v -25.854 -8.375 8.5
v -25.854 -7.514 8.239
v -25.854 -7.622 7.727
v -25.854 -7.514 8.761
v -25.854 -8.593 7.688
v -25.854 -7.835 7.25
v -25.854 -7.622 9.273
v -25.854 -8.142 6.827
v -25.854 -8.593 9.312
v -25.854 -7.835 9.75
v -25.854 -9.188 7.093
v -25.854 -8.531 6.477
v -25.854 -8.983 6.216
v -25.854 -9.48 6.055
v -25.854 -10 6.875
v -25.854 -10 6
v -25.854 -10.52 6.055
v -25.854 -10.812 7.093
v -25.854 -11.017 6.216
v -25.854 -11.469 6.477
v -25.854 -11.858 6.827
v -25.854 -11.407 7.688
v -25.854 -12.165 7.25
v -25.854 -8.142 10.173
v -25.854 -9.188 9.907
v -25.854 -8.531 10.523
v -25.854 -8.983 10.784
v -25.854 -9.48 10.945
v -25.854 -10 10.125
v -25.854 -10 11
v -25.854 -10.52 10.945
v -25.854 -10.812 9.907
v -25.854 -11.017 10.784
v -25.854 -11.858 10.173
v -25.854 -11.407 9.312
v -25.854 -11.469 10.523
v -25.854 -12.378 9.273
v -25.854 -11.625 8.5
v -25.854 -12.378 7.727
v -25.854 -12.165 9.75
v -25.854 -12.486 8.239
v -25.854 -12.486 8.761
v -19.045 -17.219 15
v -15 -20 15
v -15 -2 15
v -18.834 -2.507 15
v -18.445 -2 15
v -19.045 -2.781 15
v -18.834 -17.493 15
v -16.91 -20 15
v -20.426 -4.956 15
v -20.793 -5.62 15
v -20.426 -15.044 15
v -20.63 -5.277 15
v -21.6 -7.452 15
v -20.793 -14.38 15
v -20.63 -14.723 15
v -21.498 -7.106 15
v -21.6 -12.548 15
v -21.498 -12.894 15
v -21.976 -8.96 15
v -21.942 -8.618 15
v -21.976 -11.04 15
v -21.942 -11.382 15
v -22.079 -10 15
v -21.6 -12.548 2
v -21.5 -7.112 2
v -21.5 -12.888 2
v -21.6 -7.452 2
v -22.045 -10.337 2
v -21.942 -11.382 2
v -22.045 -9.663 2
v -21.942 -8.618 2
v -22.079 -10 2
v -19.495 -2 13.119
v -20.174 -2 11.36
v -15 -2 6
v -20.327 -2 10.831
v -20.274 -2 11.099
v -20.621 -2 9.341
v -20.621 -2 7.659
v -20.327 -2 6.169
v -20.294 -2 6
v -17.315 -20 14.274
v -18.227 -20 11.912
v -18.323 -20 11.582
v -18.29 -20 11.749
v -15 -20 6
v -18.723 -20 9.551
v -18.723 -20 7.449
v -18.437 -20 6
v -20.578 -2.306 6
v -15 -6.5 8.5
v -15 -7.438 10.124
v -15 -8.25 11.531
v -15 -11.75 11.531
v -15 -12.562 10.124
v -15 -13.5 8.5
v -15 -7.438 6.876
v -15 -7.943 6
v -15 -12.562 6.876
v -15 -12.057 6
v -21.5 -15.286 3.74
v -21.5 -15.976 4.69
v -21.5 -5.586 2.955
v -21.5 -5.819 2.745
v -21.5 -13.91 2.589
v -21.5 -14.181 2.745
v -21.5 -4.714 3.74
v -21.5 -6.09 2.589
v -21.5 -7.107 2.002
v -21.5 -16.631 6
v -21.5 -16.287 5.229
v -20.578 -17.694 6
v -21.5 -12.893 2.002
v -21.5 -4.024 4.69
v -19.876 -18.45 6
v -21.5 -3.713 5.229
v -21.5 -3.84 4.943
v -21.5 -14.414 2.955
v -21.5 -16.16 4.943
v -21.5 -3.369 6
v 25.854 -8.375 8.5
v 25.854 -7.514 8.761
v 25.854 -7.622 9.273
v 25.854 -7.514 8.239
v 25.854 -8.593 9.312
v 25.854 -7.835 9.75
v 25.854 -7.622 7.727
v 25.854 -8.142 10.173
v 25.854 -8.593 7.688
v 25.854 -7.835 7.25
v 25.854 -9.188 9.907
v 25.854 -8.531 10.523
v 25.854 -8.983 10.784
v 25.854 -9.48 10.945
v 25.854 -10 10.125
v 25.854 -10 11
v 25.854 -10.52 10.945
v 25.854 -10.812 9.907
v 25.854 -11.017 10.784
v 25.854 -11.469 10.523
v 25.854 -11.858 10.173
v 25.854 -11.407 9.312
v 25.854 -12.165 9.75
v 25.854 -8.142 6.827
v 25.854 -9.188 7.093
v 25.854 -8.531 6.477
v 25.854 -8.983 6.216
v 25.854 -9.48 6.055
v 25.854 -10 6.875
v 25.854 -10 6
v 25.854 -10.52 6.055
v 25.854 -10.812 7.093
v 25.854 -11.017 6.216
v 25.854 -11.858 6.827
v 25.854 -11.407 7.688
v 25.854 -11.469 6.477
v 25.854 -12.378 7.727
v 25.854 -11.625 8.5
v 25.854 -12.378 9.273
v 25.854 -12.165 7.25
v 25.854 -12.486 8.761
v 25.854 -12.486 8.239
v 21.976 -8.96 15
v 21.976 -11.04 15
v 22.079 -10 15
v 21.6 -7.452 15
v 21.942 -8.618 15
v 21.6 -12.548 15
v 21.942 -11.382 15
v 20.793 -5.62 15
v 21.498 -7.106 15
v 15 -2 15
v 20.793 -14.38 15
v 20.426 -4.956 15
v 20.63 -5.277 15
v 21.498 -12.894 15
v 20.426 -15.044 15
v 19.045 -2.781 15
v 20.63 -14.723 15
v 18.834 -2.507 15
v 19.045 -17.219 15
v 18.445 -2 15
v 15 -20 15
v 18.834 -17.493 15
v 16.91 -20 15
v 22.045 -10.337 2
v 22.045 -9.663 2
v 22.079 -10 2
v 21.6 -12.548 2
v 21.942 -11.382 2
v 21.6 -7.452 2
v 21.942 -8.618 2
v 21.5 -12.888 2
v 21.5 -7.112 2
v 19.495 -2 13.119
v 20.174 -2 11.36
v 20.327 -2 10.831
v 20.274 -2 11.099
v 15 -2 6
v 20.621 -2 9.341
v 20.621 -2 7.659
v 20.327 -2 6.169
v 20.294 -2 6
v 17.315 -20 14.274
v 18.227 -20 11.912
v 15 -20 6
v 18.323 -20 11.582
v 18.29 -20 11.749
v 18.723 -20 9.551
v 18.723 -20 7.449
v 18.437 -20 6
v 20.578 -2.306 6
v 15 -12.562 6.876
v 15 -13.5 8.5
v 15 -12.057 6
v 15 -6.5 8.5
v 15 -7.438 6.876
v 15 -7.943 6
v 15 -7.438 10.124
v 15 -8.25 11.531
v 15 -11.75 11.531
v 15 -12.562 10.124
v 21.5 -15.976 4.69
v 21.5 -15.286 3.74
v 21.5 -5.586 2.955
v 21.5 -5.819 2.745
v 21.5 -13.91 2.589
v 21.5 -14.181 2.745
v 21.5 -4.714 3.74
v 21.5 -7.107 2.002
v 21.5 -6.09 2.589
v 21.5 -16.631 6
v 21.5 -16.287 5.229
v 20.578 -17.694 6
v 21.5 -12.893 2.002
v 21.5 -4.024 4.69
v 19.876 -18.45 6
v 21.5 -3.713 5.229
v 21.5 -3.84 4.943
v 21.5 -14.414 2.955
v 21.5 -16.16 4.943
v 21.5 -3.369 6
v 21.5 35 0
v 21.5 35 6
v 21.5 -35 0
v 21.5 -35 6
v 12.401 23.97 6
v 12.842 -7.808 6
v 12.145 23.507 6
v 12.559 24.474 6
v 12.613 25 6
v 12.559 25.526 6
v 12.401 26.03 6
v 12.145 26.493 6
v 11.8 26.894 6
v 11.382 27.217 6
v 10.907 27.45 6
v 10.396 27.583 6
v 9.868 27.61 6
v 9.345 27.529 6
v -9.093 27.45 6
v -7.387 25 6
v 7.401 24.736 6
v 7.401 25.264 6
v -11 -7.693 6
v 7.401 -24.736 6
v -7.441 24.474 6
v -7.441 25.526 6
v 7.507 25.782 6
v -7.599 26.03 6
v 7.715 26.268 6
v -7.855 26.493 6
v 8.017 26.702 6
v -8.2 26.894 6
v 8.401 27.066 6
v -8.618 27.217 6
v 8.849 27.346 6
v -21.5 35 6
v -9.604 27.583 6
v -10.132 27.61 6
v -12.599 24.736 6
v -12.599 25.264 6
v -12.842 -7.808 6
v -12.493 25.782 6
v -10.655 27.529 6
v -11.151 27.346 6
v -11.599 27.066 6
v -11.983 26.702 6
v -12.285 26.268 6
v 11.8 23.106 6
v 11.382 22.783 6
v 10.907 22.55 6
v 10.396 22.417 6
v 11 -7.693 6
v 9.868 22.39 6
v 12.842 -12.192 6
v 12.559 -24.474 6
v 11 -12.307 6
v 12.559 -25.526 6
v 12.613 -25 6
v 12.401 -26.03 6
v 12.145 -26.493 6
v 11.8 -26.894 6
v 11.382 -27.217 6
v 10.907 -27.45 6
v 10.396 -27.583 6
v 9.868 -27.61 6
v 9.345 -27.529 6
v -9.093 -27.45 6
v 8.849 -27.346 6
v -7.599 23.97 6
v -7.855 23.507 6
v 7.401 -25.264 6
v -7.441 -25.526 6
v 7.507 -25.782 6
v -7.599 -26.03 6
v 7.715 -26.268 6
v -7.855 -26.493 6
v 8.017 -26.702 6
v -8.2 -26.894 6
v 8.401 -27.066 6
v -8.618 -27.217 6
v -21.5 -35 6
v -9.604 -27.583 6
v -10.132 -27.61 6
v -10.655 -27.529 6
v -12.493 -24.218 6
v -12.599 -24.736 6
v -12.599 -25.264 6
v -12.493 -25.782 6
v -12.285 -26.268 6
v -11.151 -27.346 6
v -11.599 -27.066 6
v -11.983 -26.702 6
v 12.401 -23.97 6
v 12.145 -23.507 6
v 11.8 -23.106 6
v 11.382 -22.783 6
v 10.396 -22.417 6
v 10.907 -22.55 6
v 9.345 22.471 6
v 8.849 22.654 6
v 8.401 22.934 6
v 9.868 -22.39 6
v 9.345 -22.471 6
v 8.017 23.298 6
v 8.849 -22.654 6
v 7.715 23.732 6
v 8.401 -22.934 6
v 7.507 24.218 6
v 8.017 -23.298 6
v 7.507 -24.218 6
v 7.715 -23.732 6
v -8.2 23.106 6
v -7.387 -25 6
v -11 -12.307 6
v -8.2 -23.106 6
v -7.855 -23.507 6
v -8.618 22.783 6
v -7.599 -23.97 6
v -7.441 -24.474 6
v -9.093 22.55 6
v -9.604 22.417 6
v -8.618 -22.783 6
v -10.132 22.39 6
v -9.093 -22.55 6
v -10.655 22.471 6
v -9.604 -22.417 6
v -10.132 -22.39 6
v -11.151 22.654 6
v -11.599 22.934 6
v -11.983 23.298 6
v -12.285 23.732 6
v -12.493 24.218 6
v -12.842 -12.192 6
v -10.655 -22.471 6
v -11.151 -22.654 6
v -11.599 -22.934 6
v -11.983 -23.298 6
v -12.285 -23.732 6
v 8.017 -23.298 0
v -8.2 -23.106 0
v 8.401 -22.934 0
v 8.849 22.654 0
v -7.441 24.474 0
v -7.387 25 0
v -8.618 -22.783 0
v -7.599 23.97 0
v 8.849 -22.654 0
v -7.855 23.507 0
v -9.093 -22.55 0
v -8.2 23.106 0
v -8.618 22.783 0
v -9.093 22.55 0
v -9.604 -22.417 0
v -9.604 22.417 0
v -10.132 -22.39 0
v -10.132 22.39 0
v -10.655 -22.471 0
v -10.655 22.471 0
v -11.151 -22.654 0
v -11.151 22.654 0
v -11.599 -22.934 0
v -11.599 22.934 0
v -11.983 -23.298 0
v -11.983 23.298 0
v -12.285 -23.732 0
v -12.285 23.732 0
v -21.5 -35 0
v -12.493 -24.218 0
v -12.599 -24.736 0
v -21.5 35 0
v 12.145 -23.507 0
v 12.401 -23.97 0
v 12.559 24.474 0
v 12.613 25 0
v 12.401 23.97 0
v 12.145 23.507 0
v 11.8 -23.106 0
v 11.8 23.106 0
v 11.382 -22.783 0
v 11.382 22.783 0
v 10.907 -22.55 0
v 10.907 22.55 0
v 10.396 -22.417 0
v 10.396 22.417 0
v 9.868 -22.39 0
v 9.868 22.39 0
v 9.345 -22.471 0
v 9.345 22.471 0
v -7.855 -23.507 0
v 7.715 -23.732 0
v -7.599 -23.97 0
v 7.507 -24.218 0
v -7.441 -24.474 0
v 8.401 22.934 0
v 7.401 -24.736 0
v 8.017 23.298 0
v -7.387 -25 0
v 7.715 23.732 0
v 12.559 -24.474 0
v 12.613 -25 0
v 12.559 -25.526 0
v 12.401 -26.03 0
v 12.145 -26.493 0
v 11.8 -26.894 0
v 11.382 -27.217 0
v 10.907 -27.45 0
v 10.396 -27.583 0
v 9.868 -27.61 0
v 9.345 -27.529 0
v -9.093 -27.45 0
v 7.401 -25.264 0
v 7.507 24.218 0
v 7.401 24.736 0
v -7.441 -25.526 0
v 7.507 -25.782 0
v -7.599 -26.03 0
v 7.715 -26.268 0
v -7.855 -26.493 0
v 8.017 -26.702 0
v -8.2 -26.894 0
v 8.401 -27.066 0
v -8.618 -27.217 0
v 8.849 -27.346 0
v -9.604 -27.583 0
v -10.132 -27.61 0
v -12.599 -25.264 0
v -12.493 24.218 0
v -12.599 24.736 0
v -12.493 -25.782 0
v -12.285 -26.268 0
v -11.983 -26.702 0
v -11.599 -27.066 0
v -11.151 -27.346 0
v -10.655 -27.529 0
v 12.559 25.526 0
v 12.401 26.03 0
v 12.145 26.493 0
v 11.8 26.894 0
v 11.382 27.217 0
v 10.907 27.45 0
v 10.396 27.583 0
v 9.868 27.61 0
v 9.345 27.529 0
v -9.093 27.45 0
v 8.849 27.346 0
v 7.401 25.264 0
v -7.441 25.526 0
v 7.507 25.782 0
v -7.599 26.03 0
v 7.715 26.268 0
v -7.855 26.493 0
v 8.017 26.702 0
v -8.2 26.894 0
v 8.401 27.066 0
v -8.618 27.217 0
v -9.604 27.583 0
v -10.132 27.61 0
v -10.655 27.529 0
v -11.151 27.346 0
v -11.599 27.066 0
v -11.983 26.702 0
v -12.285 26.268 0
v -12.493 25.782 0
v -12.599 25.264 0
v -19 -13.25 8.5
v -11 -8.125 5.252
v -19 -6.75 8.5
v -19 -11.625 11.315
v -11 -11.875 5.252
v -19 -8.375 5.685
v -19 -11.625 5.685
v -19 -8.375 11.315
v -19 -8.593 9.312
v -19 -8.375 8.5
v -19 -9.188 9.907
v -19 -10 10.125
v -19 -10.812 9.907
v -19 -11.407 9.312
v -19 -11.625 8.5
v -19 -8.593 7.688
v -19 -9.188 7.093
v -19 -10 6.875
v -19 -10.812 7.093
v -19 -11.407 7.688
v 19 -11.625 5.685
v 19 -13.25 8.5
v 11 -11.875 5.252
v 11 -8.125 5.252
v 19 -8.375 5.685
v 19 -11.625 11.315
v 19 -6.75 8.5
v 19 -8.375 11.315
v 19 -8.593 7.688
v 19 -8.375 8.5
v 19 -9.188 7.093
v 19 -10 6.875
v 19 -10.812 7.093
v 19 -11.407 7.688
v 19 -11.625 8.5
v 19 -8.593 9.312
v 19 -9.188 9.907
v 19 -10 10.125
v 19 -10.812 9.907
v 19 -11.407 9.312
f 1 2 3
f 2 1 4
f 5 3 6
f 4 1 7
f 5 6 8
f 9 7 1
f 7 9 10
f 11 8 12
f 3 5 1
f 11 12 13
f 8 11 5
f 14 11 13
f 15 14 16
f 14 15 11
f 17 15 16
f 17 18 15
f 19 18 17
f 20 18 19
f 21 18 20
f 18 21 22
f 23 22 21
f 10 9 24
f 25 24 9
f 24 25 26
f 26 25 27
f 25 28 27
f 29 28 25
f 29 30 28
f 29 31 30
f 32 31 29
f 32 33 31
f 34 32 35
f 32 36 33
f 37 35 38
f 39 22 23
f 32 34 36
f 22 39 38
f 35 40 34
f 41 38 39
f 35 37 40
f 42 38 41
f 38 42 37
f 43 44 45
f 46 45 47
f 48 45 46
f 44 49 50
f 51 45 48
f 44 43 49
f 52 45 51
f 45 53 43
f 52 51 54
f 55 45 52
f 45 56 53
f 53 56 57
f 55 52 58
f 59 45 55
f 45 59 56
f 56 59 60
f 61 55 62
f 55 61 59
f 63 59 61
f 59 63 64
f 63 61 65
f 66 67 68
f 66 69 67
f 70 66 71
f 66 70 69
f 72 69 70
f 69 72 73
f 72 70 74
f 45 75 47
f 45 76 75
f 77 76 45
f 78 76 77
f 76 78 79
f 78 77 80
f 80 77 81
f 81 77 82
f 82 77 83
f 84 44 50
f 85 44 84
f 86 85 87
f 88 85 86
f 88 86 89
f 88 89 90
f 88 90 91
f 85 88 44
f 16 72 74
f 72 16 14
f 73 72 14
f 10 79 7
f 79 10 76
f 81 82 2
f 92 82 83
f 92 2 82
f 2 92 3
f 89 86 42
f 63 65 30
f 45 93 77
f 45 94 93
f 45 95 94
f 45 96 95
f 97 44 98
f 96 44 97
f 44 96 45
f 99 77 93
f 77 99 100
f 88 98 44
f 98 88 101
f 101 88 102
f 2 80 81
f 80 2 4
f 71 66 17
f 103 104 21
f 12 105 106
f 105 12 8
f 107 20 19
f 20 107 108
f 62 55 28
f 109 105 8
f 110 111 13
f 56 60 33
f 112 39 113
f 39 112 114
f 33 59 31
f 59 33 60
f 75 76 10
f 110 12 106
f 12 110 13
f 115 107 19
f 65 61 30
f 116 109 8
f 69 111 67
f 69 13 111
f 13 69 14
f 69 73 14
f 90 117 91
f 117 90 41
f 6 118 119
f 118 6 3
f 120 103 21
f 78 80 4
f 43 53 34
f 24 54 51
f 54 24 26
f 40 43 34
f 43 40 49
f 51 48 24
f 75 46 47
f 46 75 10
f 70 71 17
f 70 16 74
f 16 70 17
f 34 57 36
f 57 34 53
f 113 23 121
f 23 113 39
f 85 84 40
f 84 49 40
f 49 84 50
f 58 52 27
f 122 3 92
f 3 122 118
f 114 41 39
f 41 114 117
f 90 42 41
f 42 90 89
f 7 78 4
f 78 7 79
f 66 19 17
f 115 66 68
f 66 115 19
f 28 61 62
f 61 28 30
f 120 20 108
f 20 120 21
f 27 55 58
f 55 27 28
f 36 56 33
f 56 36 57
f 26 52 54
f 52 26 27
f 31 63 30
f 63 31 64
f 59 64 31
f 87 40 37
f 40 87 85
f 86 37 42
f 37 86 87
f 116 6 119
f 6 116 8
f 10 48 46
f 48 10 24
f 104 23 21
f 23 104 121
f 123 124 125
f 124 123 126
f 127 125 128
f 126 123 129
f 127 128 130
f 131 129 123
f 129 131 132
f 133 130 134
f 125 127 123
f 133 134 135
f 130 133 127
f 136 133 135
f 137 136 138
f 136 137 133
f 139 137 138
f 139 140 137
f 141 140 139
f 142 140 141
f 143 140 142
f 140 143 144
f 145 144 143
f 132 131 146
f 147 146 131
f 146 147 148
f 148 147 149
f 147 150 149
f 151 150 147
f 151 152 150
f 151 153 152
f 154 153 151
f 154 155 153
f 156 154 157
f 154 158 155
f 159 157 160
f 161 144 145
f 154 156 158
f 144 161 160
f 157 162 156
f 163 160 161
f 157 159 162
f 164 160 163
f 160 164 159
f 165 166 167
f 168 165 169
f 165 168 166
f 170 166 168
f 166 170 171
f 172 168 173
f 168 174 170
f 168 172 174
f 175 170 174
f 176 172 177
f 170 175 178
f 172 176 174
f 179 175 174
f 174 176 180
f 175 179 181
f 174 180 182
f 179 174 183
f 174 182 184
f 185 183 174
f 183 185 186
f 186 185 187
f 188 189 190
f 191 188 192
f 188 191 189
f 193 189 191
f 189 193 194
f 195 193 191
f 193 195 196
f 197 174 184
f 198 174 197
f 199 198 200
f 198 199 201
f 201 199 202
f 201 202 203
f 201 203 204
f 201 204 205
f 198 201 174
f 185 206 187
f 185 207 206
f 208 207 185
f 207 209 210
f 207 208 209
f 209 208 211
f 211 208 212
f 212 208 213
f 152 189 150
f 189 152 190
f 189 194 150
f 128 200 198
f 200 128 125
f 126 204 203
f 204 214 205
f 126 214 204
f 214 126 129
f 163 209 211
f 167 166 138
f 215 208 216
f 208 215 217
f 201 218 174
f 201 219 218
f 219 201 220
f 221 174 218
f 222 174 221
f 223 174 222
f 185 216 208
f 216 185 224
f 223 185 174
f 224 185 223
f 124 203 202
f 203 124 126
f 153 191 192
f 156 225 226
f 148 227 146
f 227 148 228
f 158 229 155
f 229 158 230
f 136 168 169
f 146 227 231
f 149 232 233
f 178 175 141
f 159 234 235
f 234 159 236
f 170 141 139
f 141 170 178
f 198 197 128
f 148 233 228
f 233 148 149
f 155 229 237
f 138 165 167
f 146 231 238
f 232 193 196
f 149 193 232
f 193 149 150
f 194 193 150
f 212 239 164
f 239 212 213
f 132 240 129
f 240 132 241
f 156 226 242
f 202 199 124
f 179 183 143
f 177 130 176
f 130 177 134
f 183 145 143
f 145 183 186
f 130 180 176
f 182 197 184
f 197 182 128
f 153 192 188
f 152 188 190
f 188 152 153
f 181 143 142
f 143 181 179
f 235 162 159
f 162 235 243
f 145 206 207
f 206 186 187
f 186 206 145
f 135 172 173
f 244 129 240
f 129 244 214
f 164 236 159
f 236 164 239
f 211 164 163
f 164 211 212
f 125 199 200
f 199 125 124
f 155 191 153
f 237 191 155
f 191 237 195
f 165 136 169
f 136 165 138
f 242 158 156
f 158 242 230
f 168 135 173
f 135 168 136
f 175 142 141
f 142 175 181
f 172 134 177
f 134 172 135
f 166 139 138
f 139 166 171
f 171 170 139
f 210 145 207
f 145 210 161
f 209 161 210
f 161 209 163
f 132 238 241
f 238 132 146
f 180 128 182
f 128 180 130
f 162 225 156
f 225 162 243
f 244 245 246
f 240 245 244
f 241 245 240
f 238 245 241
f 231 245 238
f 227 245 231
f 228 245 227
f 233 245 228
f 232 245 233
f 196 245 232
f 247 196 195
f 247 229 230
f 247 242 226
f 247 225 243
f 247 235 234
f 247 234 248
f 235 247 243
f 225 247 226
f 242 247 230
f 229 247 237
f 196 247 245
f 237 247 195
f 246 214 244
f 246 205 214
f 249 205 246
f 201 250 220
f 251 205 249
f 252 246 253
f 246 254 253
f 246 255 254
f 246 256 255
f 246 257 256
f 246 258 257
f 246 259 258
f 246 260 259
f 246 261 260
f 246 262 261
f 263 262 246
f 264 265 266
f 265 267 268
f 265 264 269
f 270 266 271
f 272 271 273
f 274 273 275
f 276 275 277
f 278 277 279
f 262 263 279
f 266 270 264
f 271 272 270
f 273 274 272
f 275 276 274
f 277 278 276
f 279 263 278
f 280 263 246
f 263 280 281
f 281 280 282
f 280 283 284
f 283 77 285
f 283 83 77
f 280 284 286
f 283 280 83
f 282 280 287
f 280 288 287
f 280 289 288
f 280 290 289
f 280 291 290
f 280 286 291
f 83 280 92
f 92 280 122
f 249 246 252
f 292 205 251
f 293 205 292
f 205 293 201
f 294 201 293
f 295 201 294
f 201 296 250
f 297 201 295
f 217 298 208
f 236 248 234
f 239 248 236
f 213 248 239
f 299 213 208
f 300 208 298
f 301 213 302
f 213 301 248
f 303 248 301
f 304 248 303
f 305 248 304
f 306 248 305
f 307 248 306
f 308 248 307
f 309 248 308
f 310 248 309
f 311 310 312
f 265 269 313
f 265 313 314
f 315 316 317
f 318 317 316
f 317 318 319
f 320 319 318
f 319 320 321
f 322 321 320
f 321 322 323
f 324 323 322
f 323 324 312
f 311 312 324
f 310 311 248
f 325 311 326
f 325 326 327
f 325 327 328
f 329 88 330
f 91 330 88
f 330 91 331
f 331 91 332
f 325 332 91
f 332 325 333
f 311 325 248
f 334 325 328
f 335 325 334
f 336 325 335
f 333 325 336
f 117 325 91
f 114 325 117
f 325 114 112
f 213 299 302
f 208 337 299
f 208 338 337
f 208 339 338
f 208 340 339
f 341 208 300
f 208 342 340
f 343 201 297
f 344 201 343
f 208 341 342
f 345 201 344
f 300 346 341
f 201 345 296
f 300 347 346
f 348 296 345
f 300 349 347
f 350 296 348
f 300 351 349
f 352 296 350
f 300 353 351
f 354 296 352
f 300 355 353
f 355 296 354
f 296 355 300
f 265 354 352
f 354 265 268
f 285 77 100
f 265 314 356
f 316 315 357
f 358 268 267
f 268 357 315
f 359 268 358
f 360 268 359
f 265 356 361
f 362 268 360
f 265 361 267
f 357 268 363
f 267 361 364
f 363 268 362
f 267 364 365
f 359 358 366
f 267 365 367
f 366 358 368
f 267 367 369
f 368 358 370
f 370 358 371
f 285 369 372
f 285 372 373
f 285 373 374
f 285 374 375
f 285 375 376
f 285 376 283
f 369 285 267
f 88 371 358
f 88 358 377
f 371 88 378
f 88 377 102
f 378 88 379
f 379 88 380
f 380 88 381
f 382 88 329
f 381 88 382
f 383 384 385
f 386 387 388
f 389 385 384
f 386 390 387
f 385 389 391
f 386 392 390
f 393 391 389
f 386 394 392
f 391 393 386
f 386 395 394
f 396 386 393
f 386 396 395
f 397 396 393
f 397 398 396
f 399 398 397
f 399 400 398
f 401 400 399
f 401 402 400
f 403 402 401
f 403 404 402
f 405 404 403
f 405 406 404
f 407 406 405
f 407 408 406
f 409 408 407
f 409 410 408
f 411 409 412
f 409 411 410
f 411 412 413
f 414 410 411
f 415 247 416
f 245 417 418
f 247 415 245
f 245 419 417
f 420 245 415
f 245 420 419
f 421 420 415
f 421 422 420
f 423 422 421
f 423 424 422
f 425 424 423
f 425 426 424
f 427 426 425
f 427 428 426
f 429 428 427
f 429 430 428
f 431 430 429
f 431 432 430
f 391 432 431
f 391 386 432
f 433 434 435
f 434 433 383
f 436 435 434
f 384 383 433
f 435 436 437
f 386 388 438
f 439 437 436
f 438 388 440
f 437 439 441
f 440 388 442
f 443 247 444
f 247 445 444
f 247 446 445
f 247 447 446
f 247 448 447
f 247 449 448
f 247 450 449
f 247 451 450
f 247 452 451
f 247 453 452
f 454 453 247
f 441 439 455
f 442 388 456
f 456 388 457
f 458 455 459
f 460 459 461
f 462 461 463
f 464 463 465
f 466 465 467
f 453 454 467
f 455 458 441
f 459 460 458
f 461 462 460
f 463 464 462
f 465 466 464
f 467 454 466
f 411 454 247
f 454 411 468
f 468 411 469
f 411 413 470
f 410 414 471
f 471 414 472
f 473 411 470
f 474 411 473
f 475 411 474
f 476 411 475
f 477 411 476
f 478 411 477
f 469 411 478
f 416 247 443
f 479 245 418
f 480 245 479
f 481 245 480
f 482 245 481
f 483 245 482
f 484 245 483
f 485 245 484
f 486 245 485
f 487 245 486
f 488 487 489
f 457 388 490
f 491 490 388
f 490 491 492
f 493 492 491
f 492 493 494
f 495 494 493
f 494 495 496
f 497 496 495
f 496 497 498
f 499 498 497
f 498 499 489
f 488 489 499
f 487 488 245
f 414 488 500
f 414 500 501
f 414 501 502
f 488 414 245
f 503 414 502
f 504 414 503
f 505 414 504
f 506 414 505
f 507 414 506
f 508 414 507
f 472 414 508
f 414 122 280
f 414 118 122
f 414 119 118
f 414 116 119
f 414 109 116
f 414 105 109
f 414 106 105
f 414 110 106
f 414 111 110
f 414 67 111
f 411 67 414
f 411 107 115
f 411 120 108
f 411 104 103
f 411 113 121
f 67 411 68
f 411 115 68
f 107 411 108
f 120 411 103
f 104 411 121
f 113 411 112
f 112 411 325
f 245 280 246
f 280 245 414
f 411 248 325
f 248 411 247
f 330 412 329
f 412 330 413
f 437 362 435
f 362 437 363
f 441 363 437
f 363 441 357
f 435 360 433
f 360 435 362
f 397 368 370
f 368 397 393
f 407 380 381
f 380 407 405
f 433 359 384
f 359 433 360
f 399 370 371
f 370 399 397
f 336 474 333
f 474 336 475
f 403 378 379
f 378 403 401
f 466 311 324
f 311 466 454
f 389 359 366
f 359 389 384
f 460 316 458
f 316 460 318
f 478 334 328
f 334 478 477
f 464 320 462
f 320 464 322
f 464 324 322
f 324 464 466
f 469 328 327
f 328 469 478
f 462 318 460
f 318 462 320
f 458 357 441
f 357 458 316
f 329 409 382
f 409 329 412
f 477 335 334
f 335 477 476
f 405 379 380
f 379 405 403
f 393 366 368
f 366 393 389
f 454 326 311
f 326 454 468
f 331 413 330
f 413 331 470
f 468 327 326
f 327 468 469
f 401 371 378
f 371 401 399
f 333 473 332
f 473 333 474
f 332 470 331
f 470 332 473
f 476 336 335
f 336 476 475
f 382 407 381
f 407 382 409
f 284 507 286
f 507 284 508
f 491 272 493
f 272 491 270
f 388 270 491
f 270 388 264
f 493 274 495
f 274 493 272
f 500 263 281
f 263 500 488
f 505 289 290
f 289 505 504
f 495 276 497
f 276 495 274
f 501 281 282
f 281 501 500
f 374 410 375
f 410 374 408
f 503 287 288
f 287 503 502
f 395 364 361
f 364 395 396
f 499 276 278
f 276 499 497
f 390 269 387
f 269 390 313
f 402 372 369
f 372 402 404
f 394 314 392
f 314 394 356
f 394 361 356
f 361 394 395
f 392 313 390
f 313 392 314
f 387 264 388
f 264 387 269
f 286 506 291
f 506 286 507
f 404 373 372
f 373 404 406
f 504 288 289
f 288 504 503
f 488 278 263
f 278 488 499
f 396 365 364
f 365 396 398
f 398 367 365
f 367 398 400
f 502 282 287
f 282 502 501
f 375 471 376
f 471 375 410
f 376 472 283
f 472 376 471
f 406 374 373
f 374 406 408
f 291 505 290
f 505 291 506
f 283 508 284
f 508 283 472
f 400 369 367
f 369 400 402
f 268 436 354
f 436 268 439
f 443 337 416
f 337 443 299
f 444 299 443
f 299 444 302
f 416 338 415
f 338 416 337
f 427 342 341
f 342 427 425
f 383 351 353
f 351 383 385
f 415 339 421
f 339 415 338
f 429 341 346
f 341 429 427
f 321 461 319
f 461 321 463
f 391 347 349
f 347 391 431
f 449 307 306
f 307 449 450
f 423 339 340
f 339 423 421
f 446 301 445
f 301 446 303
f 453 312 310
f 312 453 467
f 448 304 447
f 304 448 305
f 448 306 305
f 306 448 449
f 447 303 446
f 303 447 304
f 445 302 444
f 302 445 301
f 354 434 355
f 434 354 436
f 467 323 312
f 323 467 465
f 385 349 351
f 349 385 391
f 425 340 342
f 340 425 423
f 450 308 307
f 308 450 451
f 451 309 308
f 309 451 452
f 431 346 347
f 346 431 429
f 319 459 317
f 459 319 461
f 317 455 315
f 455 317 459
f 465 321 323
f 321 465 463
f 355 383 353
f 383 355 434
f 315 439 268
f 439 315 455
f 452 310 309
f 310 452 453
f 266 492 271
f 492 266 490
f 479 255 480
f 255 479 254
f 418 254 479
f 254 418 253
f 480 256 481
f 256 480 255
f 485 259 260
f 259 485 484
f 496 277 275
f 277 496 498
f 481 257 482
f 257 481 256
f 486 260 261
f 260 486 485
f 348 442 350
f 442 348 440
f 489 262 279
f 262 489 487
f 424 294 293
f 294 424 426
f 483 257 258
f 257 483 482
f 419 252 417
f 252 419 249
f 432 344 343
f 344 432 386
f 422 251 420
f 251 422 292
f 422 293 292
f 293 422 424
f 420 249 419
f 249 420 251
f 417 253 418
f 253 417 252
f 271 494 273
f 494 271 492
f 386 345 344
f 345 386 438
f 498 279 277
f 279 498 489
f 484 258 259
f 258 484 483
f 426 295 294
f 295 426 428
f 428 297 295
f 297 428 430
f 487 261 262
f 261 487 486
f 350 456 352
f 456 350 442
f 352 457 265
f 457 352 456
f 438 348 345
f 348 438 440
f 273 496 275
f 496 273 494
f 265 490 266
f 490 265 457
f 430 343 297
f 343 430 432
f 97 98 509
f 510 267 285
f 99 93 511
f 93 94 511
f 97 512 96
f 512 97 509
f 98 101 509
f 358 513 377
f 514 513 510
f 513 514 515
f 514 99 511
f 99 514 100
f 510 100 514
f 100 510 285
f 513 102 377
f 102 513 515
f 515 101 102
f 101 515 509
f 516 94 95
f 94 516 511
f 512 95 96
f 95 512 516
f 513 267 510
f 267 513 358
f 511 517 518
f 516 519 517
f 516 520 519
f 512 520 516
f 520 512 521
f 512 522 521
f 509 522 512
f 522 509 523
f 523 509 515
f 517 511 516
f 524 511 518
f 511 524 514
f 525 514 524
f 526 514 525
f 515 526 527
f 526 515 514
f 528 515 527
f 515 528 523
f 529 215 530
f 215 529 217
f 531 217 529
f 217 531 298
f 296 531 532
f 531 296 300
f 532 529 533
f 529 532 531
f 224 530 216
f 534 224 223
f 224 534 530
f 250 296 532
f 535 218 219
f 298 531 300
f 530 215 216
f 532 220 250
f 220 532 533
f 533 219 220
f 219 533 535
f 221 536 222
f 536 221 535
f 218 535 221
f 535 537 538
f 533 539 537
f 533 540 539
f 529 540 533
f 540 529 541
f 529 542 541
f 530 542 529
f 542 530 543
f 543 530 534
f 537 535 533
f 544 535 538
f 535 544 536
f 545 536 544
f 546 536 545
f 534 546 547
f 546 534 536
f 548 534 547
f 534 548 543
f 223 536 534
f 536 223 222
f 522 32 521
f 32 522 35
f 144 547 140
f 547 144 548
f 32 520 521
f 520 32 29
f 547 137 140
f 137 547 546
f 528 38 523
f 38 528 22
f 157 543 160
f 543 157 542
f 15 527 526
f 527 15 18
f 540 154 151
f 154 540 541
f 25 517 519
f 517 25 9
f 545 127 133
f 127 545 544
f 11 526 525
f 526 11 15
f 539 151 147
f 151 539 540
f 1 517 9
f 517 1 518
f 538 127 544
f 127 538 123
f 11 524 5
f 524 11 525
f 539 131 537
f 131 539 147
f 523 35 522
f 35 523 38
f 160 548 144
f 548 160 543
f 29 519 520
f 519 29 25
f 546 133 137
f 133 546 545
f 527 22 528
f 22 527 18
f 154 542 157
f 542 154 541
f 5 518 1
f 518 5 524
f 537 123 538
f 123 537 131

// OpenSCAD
// file: crownedpulley.scad
// Crowned Pulley
// John Rood, 2012-11-18
// inspired by http://www.thingiverse.com/thing:14117 by DaleDunn

$fn = 100;

// 608
crownRadius = 13.6;
pulleyHeight = 9;
bearingSize = 22;
bearingClearing = 0.1; // 22.6mm inside diameter
innerHole = 9.15;

// 605
// pulleyHeight = 5+2;
// bearingSize = 14;
// bearingClearing = 0.1;
// innerHole = bearingSize/2-1.5;
// crownRadius = bearingSize/2+2;

function pulley_width() = pulleyHeight;
function pulley_diameter() = crownRadius*2;

echo(str("pulley_diameter=", crownRadius*2));
module crowned_pulley() {
	difference() {
	    intersection() {
	        cylinder(r = crownRadius, h = pulleyHeight);
	        translate([0, 0, pulleyHeight / 2]) sphere(r=crownRadius);
	    }
	    translate([0, 0, 1])
	        cylinder(r = (bearingSize + bearingClearing) / 2, h = pulleyHeight);
	    translate([0, 0, -1])
	        cylinder(r = innerHole, h = pulleyHeight + 2);
	}
}

crowned_pulley();
// file: myLibs.scad
pi= 3.14159265359;

module hole(diam, height, clearance= 0.1)
{
        fn= round(diam * pi / 0.5);
        cylinder(h= height, r=diam / 2 / cos(180 / fn) + clearance, $fn=fn);
}

module nutTrap(ffd, faces=6, height=1)
{
	cylinder(h= height, r=ffd / cos(180 / faces) / 2 + 0.05, $fn=faces);
}

// A slot which has rounded ends, but total length is l
module slot(d= 4, l= 8, ht= 1, clearance=0.1) {
	fn= round(d * pi / 0.5);
	rd= d / 2 / cos(180 / fn) + clearance;
	d1= rd*2;
	union() {
		translate([0,0,ht/2]) cube([l-d1, d1, ht], center=true);
		translate([-(l-d1)/2, 0, ht/2]) cylinder(h=ht, r=rd, $fn=fn, center=true); 
		translate([(l-d1)/2, 0, ht/2]) cylinder(h=ht, r=rd, $fn=fn, center=true); 
	}	
}

module nslot(d=4, l= 8, ht=1, clearance=0.1) {
	x= l-(d+clearance);
	hull() {
		translate([x/2, 0, 0])  hole(d, ht, clearance);
		translate([-x/2,0,0]) hole(d,ht, clearance);
	}
}
// file: carriage_plate_standard_c14005_rev_2.scad
// MakerSlide Component
// http://www.makerslide.com
// c14005_rev_2
// Standard Wheel Carriage Plate
// Original by Barton Dring
// OpenSCAD model by Mike Sheldrake

centeredCarriagePlate();

module centeredCarriagePlate() {
	translate([-90/2,-160/2,0]) standard_wheel_carriage_plate();
}

module standard_wheel_carriage_plate(thickness=3.175) {
color([175/255,178/255,183/255])
difference() {

// 90mm by 160mm plate 
// 3.175mm thick by default,
// but you can pass a different thickness to this module
cube([90,160,3.175],center=false);

// 5mm diam. holes
for(i=[
  [12.7,10],
  [12.7,30],
  [12.7,70],
  [12.7,80],
  [12.7,90],
  [12.7,112.3],
  [12.7,130],
  [12.7,150],
  [35,10],
  [35,60],
  [35,80],
  [35,100],
  [35,150],
  [45,70],
  [45,90],
  [55,10],
  [55,60],
  [55,80],
  [55,100],
  [55,150],
  [77.3,30],
  [77.3,70],
  [77.3,90],
  [77.3,112.3],
  [77.3,130],

  //These are 5mm holes in the 7mm hole spots that we will do next.
  //For some reason including them here too makes the OpenCSG display look right.
  //Not needed for CGAL render though.
  [12.7,47.7],
  [45,47.7],
  [77.3,10],
  [77.3,47.7],
  [77.3,80],
  [77.3,150]

  ]) { translate([i[0],i[1],-0.2]) cylinder(h=thickness+1,r=5/2,center=false); }

// 7mm diam. holes 
for(i=[
  [12.7,47.7],
  [45,47.7],
  [77.3,10],
  [77.3,47.7],
  [77.3,80],
  [77.3,150]
  ]) { translate([i[0],i[1],-0.2]) cylinder(h=thickness+1,r=7/2,center=false); }

// rounded corners on plate 
for(i=[
  [0,0,0],
  [90,160,180],
  [90,0,90],
  [0,160,270]
  ]
  ) {
	translate([i[0],i[1],0]) rotate(a=[0,0,i[2]]) translate([10,10,-0.1]) rotate(a=[0,0,180]) difference() {
		cube([11,11,thickness+1],center=false);
		translate([0,0,-0.1]) cylinder(h=thickness+2,r=10,center=false);
		}
	}
}
}
// file: configuration.scad
// Increase this if your slicer or printer make holes too tight.
extra_radius = 0.0;

// OD = outside diameter, corner to corner.
m3_nut_od = 6.1;
m3_nut_radius = m3_nut_od/2 + 0.2 + extra_radius;

// Major diameter of metric 3mm thread.
m3_major = 2.85;
m3_radius = m3_major/2 + extra_radius;
m3_wide_radius = m3_major/2 + 0.2 + extra_radius;

// NEMA17 stepper motors.
motor_shaft_diameter = 5;
motor_shaft_radius = motor_shaft_diameter/2 + extra_radius;

// Frame brackets.
thickness = 3.6;
// main file
/*
 * Based on Johanns mini kossel design
 * https://github.com/jcrocholl/kossel
 */
include <configuration.scad>;

use <carriage_plate_standard_c14005_rev_2.scad>
use <myLibs.scad>
use <crownedpulley.scad>

//separation = 40;
ratio= 1.39;
separation = 37.2*ratio;
echo(str("Separation= ", separation));

thickness = 6;

horn_thickness = 13;
horn_x = 15;
horn_y = -10;
horn_offset = 2;

gt2_pulley_inner_dia= 12.25;
belt_thick= 1.7;
belt_width = 6;
belt_x_l = gt2_pulley_inner_dia/2 + belt_thick/2;
belt_x_r_upper = -belt_x_l + belt_thick + pulley_diameter();
belt_x_r_lower = belt_x_l + belt_thick/2;
belt_z = 7;

module carriage() {
  // Timing belt (up and down).
  %translate([-belt_x_l, 0, belt_z + belt_width/2]) cube([belt_thick, 100, belt_width], center=true);
  %translate([belt_x_r_upper, 100/2, belt_z + belt_width/2]) cube([belt_thick, 100, belt_width], center=true);
  %translate([belt_x_r_lower, -100/2, belt_z + belt_width/2]) cube([belt_thick, 100, belt_width], center=true);
  difference() {
    union() {
      // Main body.
      translate([0, 0, thickness/2]) cube([43, 70, thickness], center=true);
      // Ball joint mount horns.
      for (x = [-1, 1]) {
        scale([x, 1, 1]) intersection() {
          translate([0, horn_y-1, horn_thickness/2+horn_offset])
            cube([separation, 18, horn_thickness], center=true);
          translate([horn_x, horn_y, horn_thickness/2+horn_offset]) rotate([0, 90, 0])
            cylinder(r1=14, r2=2.5, h=separation/2-horn_x);
        }
      }
      // Belt clamps.
      *difference() {
        union() {
          translate([6.5, -2.5, horn_thickness/2+1])
            cube([14, 7, horn_thickness-2], center=true);
          translate([10.75, 2.5, horn_thickness/2+1])
            cube([5.5, 16, horn_thickness-2], center=true);
        }
        // Avoid touching diagonal push rods (carbon tube).
        translate([20, -10, 12.5]) rotate([35, 35, 30])
          cube([40, 40, 20], center=true);
      }
      *for (y = [-12, 7]) {
        translate([1.25, y, horn_thickness/2+1])
          cube([7, 8, horn_thickness-2], center=true);
      }
    }
    // Screws for linear slider.
    for (x = [-10, 10]) {
      for (y = [-25, 25]) {
        #translate([x, y, thickness-30/2]) hole(5, 30);
      }
    }
    // Screws for ball joints.
    translate([0, horn_y, horn_thickness/2+horn_offset]) rotate([0, 90, 0]) #
      cylinder(r=m3_wide_radius, h=60, center=true, $fn=12);
    // Lock nuts for ball joints.
    for (x = [-1, 1]) {
      scale([x, 1, 1]) intersection() {
        translate([horn_x, horn_y, horn_thickness/2+horn_offset]) rotate([90, 0, -90])
          cylinder(r1=m3_nut_radius, r2=m3_nut_radius+0.5, h=8,
                   center=true, $fn=6);
      }
    }
  }
}

carriage();

%translate([0,-45,-3.175]) rotate([0,0,0]) translate([-90/2,-160/2,0]) standard_wheel_carriage_plate();
//%translate([0,0,-3.175]) rotate([0,0,90]) translate([-90/2,-160/2,0]) standard_wheel_carriage_plate();
